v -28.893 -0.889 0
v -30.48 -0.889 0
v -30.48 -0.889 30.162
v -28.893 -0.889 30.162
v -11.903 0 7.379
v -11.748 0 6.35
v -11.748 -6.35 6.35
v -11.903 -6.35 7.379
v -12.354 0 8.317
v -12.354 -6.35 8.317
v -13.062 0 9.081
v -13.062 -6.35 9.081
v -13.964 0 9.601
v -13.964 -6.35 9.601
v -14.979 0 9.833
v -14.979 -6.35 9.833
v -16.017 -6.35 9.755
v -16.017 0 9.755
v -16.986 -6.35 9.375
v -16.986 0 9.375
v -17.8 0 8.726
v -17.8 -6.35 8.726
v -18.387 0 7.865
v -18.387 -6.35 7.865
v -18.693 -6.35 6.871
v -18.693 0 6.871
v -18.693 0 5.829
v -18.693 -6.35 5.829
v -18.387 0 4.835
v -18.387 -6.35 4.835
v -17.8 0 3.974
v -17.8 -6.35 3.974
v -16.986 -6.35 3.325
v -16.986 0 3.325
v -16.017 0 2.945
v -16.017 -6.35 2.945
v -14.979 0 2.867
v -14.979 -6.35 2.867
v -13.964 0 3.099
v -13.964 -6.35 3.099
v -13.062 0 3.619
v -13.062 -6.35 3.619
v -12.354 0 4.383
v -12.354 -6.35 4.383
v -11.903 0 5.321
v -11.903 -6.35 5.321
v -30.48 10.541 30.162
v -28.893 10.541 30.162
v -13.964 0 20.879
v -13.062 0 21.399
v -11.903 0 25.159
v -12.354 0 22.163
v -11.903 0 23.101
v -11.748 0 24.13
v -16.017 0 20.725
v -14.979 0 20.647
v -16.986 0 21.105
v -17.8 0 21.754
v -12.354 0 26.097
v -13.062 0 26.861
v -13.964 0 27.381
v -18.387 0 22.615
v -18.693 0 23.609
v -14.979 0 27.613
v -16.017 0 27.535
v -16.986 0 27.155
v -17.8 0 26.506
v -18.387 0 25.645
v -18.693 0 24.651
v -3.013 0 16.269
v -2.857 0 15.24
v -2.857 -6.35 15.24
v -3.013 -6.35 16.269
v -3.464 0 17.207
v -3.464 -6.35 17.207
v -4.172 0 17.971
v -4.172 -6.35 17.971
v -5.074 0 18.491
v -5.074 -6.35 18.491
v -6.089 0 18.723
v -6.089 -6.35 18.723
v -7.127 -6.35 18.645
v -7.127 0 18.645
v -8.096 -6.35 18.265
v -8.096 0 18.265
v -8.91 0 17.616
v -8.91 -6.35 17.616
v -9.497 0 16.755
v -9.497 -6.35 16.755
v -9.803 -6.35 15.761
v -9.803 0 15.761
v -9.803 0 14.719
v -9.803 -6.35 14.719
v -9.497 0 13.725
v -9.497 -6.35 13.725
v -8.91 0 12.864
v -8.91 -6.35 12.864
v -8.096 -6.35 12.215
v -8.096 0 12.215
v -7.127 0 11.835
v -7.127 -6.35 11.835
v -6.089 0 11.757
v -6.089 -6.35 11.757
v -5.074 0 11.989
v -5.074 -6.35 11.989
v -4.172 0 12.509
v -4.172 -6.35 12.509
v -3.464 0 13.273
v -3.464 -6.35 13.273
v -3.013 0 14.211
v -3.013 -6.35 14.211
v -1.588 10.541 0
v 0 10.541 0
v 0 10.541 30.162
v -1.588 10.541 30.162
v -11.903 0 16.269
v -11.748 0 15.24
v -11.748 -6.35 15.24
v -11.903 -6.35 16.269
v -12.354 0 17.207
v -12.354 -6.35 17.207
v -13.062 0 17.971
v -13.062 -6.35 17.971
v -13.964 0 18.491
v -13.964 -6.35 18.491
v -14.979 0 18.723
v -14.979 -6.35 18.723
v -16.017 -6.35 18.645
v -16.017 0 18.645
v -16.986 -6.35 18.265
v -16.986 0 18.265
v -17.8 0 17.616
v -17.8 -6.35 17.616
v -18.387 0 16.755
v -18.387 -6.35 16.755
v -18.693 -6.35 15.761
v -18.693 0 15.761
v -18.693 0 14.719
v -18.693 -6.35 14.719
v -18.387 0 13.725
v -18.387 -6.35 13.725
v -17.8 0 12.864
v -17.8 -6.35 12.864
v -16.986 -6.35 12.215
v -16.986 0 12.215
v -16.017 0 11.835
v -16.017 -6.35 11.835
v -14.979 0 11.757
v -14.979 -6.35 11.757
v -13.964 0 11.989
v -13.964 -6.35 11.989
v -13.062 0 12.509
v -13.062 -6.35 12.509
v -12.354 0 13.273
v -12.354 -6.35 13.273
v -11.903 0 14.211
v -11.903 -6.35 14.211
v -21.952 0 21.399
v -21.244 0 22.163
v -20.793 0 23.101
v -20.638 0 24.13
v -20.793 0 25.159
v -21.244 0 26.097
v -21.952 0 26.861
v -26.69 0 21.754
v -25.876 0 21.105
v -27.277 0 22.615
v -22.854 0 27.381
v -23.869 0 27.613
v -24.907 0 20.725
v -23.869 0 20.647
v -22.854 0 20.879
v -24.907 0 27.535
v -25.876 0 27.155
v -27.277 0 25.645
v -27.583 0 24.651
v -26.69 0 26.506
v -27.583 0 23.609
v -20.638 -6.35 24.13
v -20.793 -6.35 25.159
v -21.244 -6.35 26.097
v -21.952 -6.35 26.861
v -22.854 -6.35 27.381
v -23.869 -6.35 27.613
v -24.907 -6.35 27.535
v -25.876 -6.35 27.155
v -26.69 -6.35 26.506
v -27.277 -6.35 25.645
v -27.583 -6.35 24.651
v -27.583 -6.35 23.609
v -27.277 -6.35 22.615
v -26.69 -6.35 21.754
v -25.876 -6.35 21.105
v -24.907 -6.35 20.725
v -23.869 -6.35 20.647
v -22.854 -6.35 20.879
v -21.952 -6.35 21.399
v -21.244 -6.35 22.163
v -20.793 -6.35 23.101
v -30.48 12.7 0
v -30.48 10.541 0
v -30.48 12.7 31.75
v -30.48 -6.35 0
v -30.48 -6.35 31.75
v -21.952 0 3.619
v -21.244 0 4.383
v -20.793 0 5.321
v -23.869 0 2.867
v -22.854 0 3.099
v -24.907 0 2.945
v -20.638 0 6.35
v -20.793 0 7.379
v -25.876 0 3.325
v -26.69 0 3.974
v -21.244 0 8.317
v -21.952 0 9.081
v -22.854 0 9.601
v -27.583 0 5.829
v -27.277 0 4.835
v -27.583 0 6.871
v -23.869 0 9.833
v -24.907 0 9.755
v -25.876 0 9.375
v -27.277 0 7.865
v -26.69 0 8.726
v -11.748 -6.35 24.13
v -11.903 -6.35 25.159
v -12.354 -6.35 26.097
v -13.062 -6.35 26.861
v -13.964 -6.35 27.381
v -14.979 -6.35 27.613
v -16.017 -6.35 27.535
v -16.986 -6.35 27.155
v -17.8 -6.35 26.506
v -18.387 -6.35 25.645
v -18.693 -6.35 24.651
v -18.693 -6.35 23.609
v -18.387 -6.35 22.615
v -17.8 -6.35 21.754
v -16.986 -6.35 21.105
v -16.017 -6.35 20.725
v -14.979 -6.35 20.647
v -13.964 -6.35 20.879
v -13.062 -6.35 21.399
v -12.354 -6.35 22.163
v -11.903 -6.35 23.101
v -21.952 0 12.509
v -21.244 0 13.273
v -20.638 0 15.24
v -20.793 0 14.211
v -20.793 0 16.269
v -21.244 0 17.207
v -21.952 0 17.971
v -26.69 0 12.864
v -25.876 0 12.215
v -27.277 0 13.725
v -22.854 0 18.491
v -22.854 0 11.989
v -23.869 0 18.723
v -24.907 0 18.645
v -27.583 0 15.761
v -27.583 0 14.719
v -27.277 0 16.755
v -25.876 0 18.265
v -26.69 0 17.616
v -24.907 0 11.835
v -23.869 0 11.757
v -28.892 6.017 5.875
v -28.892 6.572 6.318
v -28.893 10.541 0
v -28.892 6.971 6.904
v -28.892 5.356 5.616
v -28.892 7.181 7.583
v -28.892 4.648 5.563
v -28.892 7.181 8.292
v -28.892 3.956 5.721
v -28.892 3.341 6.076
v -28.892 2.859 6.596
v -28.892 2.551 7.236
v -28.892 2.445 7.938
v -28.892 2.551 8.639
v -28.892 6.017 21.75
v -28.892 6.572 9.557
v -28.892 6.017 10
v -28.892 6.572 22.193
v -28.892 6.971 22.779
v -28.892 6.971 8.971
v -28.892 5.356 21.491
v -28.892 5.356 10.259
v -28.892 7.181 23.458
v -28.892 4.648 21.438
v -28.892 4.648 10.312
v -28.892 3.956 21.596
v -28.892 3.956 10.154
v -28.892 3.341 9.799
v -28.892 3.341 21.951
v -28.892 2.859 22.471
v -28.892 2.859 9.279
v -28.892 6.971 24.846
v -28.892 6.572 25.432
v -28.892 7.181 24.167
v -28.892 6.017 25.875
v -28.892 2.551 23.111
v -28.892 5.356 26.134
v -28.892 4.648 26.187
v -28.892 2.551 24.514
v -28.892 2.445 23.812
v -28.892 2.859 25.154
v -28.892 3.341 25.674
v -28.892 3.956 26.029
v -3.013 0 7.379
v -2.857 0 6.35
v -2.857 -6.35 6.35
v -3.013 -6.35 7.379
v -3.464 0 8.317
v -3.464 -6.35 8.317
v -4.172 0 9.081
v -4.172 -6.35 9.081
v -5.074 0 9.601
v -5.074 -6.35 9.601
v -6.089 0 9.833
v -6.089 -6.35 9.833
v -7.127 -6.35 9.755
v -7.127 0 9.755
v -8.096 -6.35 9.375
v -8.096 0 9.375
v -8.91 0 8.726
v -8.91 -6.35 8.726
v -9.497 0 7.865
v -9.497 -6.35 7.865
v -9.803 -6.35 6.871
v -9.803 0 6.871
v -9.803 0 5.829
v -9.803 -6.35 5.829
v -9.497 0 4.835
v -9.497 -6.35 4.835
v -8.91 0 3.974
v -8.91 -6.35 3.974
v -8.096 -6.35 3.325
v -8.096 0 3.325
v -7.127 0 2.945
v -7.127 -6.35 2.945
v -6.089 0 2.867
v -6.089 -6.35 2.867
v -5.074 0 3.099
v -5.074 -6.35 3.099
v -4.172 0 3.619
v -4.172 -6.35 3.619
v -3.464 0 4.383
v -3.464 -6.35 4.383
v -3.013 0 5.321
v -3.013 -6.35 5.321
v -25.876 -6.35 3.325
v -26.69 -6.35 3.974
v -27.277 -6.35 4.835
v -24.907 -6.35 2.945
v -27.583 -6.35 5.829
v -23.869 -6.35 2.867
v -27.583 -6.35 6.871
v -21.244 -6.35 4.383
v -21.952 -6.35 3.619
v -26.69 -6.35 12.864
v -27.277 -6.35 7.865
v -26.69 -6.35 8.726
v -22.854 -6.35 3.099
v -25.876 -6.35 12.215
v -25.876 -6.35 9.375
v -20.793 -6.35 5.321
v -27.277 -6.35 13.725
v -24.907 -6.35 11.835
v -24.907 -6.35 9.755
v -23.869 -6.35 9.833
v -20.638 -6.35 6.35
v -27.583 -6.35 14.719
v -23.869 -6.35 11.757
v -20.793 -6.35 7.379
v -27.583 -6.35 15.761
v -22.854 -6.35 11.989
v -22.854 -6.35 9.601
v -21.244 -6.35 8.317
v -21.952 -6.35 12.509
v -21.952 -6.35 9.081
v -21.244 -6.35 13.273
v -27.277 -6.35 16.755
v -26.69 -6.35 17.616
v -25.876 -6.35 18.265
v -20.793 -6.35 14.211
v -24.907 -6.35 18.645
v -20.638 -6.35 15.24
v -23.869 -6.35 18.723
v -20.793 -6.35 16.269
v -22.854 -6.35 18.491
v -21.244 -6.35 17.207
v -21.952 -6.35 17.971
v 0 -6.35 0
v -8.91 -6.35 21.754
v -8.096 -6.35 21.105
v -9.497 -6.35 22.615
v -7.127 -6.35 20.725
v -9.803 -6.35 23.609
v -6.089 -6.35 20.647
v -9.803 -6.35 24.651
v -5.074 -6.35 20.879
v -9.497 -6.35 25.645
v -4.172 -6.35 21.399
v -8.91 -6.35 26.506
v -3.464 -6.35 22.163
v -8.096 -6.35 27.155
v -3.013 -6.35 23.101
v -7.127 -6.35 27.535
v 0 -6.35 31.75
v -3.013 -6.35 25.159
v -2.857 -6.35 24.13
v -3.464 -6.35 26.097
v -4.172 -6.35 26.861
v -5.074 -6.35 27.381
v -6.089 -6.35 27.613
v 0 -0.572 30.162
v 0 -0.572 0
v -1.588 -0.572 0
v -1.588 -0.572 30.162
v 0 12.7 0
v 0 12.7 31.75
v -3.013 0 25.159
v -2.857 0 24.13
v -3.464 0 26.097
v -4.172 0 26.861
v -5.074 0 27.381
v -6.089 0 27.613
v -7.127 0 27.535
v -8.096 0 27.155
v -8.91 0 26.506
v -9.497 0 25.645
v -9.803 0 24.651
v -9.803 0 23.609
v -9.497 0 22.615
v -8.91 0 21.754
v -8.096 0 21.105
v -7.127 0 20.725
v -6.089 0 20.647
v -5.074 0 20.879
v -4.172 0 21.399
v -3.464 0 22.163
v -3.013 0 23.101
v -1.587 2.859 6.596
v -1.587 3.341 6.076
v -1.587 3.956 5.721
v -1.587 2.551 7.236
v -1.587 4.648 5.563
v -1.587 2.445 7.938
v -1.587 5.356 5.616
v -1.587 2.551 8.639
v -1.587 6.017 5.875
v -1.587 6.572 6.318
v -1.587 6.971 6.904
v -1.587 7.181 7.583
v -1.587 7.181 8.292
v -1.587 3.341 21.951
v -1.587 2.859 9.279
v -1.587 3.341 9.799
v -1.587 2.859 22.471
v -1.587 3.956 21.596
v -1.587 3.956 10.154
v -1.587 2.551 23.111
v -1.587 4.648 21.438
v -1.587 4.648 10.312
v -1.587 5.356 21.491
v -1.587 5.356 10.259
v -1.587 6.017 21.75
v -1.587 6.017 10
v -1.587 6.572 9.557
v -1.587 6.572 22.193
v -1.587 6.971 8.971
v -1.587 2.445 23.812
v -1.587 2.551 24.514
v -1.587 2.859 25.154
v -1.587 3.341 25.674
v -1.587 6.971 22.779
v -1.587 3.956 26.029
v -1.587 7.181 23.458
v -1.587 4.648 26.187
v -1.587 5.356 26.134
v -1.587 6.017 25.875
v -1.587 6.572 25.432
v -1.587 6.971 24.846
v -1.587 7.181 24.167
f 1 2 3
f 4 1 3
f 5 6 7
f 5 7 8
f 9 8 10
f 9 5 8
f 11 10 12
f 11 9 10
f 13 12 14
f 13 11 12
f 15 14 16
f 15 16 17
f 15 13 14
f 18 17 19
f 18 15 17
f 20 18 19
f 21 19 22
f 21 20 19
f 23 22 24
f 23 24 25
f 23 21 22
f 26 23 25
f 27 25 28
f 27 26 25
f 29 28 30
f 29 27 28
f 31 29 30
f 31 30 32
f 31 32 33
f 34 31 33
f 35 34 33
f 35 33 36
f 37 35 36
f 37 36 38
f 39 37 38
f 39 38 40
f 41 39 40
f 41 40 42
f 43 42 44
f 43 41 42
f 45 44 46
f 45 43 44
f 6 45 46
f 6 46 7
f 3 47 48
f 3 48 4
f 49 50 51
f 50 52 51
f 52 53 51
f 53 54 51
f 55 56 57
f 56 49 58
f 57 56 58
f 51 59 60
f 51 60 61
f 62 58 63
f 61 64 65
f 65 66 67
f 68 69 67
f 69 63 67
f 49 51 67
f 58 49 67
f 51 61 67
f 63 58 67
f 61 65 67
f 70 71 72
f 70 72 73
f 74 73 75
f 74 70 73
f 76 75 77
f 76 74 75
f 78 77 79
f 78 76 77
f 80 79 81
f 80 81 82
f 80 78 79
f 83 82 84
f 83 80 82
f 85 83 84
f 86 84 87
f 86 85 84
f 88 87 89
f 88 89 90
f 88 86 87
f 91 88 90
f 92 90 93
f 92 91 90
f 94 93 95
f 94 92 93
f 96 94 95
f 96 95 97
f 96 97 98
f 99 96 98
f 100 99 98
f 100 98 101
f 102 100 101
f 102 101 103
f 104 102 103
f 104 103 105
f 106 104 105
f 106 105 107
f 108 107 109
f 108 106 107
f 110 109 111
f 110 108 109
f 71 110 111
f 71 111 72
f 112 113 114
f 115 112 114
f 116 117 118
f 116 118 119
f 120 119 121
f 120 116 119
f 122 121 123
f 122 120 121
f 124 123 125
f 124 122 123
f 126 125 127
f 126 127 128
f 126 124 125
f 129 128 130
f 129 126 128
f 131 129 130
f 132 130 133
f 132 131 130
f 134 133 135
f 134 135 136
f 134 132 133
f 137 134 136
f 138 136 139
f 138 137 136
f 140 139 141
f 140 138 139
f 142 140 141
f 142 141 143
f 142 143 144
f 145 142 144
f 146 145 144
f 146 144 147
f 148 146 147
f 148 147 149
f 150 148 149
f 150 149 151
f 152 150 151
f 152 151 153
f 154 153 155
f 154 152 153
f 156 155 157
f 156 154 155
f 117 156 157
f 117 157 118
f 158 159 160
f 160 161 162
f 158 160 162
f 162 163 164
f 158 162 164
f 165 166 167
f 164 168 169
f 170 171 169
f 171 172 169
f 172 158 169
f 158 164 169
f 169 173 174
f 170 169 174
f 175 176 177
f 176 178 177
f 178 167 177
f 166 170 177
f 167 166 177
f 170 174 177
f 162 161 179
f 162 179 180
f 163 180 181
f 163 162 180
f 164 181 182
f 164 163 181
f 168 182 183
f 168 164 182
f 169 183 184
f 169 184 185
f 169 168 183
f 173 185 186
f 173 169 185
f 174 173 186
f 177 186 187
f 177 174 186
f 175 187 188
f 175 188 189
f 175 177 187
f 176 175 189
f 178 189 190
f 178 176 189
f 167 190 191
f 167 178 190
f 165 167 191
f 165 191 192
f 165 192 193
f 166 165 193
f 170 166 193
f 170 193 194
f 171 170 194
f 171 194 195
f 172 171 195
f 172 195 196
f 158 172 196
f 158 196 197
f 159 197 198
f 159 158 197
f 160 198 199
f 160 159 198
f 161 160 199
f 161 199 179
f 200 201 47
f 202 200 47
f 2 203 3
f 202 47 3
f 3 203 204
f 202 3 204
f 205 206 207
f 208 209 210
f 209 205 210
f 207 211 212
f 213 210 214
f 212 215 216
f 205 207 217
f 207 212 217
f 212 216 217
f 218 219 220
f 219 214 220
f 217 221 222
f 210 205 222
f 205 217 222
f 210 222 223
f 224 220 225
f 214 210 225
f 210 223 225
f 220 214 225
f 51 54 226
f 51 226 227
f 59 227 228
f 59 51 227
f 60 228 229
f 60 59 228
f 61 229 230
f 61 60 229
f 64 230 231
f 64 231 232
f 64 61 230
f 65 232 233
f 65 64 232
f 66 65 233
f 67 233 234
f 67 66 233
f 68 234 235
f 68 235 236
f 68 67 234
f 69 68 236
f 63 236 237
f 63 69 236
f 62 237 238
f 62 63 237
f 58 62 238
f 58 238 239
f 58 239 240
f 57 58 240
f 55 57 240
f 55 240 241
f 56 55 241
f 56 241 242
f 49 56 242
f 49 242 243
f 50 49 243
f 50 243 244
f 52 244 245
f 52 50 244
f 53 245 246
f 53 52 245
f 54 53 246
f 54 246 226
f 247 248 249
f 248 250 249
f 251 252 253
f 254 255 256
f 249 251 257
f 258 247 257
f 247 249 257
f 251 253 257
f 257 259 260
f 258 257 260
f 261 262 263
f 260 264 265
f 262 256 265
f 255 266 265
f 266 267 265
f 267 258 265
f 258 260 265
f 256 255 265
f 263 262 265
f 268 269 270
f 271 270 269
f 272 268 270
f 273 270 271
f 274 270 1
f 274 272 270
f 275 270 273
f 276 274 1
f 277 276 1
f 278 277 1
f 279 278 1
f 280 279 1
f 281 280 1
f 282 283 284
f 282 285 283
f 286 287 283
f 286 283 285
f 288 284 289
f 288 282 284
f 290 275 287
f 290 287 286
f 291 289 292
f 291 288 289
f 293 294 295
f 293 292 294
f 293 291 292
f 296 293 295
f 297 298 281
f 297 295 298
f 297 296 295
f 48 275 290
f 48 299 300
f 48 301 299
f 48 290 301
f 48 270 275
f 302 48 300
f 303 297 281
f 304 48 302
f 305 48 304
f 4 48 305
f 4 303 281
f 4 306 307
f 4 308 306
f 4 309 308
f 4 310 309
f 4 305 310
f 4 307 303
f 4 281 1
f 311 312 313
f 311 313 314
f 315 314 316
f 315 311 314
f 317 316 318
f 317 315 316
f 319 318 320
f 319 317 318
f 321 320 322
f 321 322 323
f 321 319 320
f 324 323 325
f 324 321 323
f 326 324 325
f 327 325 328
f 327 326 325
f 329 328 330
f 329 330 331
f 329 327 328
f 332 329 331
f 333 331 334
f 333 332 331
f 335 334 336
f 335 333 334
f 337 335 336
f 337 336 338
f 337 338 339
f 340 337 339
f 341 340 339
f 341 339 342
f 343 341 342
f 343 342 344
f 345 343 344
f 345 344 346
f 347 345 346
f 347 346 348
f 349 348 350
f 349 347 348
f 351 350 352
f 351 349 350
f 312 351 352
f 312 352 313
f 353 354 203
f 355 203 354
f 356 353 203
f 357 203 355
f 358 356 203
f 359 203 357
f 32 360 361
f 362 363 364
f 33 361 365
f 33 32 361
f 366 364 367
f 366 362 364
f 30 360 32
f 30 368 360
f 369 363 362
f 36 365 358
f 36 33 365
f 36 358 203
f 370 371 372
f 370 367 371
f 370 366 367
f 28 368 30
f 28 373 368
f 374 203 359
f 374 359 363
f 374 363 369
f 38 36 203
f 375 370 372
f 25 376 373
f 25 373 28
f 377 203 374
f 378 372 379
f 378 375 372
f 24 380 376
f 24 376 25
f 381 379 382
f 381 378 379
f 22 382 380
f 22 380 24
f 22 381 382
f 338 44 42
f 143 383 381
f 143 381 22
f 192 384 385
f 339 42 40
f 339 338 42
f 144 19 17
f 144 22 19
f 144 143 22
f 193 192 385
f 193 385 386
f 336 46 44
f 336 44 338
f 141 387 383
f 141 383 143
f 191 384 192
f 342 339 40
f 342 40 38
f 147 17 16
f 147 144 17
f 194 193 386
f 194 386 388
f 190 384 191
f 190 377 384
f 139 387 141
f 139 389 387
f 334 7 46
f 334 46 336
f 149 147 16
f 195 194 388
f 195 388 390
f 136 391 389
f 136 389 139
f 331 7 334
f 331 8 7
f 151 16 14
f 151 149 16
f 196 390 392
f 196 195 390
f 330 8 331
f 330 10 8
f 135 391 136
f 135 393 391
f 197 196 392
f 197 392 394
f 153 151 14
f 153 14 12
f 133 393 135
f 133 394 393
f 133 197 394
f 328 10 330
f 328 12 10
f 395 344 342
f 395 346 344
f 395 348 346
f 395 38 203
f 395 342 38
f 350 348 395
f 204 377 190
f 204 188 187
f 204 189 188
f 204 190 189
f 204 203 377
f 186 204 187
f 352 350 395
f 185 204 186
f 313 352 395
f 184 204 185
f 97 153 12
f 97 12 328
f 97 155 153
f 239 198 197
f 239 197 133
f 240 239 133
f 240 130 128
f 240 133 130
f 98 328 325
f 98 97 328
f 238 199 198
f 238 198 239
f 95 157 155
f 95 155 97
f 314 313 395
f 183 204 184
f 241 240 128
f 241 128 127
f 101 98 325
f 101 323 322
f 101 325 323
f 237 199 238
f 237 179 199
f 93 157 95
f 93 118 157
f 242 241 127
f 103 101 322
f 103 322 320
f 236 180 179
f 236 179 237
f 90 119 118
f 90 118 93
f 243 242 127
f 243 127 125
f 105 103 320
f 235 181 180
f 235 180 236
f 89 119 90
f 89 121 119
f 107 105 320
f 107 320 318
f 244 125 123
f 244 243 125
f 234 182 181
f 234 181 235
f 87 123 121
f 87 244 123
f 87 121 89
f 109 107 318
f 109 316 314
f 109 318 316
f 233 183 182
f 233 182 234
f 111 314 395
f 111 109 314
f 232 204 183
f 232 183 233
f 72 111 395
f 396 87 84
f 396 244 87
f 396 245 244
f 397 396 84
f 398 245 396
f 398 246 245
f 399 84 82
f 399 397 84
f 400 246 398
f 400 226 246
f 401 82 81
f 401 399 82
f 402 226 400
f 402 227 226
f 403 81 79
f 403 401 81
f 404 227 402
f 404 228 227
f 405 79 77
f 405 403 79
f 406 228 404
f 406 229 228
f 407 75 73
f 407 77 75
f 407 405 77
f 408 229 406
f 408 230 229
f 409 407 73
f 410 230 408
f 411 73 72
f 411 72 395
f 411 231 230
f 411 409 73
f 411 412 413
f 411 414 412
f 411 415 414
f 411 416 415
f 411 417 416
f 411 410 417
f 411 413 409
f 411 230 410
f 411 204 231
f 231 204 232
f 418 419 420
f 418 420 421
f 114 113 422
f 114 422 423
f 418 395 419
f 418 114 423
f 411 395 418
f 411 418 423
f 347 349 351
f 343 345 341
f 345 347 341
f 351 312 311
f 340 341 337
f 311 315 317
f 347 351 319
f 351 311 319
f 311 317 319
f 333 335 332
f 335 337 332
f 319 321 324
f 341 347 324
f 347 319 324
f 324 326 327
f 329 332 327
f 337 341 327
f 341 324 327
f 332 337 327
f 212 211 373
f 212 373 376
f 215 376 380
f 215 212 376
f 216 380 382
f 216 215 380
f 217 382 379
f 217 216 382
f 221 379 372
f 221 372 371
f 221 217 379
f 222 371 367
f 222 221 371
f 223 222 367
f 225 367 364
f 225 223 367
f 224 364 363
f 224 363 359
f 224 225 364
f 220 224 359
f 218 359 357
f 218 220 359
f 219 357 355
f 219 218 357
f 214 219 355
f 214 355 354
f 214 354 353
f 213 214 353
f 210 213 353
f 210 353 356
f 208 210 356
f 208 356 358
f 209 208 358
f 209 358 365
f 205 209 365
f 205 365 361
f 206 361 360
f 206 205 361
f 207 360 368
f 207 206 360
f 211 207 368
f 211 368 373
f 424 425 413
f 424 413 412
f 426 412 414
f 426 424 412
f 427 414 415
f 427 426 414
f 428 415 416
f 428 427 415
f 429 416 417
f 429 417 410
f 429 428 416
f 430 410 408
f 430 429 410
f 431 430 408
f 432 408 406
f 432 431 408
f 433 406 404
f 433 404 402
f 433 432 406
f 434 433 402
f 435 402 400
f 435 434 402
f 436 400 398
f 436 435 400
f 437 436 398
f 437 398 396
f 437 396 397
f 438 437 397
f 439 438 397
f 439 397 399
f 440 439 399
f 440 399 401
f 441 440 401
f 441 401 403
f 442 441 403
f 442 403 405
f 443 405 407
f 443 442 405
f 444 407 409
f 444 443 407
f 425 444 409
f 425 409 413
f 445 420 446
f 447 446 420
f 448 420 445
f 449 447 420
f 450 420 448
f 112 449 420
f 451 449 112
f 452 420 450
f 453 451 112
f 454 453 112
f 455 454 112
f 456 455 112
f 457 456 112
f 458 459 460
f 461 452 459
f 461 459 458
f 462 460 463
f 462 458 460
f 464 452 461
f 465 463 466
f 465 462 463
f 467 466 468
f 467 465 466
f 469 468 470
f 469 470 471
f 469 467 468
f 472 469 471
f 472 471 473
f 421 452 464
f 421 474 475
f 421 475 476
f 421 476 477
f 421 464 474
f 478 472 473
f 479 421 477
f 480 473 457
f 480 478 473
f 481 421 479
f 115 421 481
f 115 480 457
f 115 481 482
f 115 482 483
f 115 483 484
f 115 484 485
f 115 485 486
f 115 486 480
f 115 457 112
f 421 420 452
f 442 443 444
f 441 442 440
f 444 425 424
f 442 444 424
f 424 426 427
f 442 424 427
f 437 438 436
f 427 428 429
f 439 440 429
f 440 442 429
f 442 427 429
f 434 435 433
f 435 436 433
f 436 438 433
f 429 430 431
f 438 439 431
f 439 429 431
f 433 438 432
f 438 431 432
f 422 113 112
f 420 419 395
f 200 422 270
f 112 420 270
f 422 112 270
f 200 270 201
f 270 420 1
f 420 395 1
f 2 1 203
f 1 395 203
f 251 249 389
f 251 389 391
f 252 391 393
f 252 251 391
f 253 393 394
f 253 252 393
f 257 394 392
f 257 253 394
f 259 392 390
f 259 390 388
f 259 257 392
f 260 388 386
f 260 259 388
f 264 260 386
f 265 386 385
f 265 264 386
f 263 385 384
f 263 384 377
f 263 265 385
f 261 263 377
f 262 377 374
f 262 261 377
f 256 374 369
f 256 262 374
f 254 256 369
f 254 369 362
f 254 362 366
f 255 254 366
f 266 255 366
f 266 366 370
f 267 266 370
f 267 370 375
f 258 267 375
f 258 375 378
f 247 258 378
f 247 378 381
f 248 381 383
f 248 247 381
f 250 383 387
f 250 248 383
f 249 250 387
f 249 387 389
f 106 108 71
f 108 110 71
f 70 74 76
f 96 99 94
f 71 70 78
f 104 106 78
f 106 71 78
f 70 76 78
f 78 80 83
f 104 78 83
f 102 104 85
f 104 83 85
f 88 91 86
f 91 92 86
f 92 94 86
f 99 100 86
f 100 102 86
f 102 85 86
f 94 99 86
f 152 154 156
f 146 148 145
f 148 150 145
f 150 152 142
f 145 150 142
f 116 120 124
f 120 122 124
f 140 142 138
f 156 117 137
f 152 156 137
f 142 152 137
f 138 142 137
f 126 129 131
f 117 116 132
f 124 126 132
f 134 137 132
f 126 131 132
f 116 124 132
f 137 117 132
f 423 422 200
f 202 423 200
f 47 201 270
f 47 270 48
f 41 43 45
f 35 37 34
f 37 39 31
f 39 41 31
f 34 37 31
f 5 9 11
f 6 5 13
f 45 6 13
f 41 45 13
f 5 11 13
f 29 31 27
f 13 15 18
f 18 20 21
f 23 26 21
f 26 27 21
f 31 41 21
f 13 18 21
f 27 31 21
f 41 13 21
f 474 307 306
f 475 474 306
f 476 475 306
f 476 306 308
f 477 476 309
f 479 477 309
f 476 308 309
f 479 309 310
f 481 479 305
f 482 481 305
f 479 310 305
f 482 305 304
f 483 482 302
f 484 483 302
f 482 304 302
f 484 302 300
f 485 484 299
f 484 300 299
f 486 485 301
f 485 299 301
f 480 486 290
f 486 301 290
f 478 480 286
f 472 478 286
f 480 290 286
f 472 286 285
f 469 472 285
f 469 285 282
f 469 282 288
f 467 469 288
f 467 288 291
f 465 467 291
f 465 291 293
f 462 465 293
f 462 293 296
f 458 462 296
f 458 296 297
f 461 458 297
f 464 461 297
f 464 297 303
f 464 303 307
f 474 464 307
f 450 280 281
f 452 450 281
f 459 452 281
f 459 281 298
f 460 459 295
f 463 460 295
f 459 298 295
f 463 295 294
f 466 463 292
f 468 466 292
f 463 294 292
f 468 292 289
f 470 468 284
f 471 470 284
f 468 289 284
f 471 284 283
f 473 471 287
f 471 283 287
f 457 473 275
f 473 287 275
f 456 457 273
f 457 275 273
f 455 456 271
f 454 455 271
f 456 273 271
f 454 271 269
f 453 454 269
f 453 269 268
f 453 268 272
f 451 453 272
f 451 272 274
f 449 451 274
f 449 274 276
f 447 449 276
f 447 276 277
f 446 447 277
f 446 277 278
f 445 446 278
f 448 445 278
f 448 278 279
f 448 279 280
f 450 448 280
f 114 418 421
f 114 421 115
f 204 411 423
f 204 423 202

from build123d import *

# Parameters (mm, degrees)
F0_W     = 30.48
F0_H     = 31.75
F0_R     = 3.4925
F1_DEPTH = 6.35
F2_W     = 30.48
F2_H     = 31.75
F3_DEPTH = 12.7
F4_W     = 11.1125
F4_H     = 30.1625
F5_DEPTH = 1.5875
F6_W     = 11.43
F6_H     = 30.1625
F7_DEPTH = 1.5875
F8_R     = 2.38125
F9_DEPTH = 28.8935


with BuildPart() as f1:
    # F0 (on Front) → F1 (new body)
    with BuildSketch(Plane.XZ):
        with Locations((-15.24, 15.875)):
            Rectangle(F0_W, F0_H)
        with Locations((-24.13, 6.35)):
            Circle(F0_R, mode=Mode.SUBTRACT)
        with Locations((-24.13, 15.24)):
            Circle(F0_R, mode=Mode.SUBTRACT)
        with Locations((-15.24, 6.35)):
            Circle(F0_R, mode=Mode.SUBTRACT)
        with Locations((-6.35, 6.35)):
            Circle(F0_R, mode=Mode.SUBTRACT)
        with Locations((-15.24, 15.24)):
            Circle(F0_R, mode=Mode.SUBTRACT)
        with Locations((-6.35, 15.24)):
            Circle(F0_R, mode=Mode.SUBTRACT)
        with Locations((-24.13, 24.13)):
            Circle(F0_R, mode=Mode.SUBTRACT)
        with Locations((-15.24, 24.13)):
            Circle(F0_R, mode=Mode.SUBTRACT)
        with Locations((-6.35, 24.13)):
            Circle(F0_R, mode=Mode.SUBTRACT)
    extrude(amount=F1_DEPTH)

    # F2 (on face) → F3 (join)
    with BuildSketch(Plane(origin=(0, 0, 0), x_dir=(-1, 0, 0), z_dir=(0, 1, 0))):
        with Locations((15.24, 15.875)):
            Rectangle(F2_W, F2_H)
    extrude(amount=F3_DEPTH)

    # F4 (on face) → F5 (cut)
    with BuildSketch(Plane.YZ):
        with Locations((4.98475, 15.08125)):
            Rectangle(F4_W, F4_H)
    extrude(amount=-F5_DEPTH, mode=Mode.SUBTRACT)

    # F6 (on face) → F7 (cut)
    with BuildSketch(Plane(origin=(-30.48, 0, 0), x_dir=(0, -1, 0), z_dir=(-1, 0, 0))):
        with Locations((-4.826, 15.08125)):
            Rectangle(F6_W, F6_H)
    extrude(amount=-F7_DEPTH, mode=Mode.SUBTRACT)

    # F8 (on face) → F9 (cut, through all)
    with BuildSketch(Plane(origin=(-28.8925, 0, 0), x_dir=(0, -1, 0), z_dir=(-1, 0, 0))):
        with Locations((-4.826, 23.8125)):
            Circle(F8_R)
        with Locations((-4.826, 7.9375)):
            Circle(F8_R)
    extrude(amount=-F9_DEPTH, mode=Mode.SUBTRACT)


solid = f1.part
